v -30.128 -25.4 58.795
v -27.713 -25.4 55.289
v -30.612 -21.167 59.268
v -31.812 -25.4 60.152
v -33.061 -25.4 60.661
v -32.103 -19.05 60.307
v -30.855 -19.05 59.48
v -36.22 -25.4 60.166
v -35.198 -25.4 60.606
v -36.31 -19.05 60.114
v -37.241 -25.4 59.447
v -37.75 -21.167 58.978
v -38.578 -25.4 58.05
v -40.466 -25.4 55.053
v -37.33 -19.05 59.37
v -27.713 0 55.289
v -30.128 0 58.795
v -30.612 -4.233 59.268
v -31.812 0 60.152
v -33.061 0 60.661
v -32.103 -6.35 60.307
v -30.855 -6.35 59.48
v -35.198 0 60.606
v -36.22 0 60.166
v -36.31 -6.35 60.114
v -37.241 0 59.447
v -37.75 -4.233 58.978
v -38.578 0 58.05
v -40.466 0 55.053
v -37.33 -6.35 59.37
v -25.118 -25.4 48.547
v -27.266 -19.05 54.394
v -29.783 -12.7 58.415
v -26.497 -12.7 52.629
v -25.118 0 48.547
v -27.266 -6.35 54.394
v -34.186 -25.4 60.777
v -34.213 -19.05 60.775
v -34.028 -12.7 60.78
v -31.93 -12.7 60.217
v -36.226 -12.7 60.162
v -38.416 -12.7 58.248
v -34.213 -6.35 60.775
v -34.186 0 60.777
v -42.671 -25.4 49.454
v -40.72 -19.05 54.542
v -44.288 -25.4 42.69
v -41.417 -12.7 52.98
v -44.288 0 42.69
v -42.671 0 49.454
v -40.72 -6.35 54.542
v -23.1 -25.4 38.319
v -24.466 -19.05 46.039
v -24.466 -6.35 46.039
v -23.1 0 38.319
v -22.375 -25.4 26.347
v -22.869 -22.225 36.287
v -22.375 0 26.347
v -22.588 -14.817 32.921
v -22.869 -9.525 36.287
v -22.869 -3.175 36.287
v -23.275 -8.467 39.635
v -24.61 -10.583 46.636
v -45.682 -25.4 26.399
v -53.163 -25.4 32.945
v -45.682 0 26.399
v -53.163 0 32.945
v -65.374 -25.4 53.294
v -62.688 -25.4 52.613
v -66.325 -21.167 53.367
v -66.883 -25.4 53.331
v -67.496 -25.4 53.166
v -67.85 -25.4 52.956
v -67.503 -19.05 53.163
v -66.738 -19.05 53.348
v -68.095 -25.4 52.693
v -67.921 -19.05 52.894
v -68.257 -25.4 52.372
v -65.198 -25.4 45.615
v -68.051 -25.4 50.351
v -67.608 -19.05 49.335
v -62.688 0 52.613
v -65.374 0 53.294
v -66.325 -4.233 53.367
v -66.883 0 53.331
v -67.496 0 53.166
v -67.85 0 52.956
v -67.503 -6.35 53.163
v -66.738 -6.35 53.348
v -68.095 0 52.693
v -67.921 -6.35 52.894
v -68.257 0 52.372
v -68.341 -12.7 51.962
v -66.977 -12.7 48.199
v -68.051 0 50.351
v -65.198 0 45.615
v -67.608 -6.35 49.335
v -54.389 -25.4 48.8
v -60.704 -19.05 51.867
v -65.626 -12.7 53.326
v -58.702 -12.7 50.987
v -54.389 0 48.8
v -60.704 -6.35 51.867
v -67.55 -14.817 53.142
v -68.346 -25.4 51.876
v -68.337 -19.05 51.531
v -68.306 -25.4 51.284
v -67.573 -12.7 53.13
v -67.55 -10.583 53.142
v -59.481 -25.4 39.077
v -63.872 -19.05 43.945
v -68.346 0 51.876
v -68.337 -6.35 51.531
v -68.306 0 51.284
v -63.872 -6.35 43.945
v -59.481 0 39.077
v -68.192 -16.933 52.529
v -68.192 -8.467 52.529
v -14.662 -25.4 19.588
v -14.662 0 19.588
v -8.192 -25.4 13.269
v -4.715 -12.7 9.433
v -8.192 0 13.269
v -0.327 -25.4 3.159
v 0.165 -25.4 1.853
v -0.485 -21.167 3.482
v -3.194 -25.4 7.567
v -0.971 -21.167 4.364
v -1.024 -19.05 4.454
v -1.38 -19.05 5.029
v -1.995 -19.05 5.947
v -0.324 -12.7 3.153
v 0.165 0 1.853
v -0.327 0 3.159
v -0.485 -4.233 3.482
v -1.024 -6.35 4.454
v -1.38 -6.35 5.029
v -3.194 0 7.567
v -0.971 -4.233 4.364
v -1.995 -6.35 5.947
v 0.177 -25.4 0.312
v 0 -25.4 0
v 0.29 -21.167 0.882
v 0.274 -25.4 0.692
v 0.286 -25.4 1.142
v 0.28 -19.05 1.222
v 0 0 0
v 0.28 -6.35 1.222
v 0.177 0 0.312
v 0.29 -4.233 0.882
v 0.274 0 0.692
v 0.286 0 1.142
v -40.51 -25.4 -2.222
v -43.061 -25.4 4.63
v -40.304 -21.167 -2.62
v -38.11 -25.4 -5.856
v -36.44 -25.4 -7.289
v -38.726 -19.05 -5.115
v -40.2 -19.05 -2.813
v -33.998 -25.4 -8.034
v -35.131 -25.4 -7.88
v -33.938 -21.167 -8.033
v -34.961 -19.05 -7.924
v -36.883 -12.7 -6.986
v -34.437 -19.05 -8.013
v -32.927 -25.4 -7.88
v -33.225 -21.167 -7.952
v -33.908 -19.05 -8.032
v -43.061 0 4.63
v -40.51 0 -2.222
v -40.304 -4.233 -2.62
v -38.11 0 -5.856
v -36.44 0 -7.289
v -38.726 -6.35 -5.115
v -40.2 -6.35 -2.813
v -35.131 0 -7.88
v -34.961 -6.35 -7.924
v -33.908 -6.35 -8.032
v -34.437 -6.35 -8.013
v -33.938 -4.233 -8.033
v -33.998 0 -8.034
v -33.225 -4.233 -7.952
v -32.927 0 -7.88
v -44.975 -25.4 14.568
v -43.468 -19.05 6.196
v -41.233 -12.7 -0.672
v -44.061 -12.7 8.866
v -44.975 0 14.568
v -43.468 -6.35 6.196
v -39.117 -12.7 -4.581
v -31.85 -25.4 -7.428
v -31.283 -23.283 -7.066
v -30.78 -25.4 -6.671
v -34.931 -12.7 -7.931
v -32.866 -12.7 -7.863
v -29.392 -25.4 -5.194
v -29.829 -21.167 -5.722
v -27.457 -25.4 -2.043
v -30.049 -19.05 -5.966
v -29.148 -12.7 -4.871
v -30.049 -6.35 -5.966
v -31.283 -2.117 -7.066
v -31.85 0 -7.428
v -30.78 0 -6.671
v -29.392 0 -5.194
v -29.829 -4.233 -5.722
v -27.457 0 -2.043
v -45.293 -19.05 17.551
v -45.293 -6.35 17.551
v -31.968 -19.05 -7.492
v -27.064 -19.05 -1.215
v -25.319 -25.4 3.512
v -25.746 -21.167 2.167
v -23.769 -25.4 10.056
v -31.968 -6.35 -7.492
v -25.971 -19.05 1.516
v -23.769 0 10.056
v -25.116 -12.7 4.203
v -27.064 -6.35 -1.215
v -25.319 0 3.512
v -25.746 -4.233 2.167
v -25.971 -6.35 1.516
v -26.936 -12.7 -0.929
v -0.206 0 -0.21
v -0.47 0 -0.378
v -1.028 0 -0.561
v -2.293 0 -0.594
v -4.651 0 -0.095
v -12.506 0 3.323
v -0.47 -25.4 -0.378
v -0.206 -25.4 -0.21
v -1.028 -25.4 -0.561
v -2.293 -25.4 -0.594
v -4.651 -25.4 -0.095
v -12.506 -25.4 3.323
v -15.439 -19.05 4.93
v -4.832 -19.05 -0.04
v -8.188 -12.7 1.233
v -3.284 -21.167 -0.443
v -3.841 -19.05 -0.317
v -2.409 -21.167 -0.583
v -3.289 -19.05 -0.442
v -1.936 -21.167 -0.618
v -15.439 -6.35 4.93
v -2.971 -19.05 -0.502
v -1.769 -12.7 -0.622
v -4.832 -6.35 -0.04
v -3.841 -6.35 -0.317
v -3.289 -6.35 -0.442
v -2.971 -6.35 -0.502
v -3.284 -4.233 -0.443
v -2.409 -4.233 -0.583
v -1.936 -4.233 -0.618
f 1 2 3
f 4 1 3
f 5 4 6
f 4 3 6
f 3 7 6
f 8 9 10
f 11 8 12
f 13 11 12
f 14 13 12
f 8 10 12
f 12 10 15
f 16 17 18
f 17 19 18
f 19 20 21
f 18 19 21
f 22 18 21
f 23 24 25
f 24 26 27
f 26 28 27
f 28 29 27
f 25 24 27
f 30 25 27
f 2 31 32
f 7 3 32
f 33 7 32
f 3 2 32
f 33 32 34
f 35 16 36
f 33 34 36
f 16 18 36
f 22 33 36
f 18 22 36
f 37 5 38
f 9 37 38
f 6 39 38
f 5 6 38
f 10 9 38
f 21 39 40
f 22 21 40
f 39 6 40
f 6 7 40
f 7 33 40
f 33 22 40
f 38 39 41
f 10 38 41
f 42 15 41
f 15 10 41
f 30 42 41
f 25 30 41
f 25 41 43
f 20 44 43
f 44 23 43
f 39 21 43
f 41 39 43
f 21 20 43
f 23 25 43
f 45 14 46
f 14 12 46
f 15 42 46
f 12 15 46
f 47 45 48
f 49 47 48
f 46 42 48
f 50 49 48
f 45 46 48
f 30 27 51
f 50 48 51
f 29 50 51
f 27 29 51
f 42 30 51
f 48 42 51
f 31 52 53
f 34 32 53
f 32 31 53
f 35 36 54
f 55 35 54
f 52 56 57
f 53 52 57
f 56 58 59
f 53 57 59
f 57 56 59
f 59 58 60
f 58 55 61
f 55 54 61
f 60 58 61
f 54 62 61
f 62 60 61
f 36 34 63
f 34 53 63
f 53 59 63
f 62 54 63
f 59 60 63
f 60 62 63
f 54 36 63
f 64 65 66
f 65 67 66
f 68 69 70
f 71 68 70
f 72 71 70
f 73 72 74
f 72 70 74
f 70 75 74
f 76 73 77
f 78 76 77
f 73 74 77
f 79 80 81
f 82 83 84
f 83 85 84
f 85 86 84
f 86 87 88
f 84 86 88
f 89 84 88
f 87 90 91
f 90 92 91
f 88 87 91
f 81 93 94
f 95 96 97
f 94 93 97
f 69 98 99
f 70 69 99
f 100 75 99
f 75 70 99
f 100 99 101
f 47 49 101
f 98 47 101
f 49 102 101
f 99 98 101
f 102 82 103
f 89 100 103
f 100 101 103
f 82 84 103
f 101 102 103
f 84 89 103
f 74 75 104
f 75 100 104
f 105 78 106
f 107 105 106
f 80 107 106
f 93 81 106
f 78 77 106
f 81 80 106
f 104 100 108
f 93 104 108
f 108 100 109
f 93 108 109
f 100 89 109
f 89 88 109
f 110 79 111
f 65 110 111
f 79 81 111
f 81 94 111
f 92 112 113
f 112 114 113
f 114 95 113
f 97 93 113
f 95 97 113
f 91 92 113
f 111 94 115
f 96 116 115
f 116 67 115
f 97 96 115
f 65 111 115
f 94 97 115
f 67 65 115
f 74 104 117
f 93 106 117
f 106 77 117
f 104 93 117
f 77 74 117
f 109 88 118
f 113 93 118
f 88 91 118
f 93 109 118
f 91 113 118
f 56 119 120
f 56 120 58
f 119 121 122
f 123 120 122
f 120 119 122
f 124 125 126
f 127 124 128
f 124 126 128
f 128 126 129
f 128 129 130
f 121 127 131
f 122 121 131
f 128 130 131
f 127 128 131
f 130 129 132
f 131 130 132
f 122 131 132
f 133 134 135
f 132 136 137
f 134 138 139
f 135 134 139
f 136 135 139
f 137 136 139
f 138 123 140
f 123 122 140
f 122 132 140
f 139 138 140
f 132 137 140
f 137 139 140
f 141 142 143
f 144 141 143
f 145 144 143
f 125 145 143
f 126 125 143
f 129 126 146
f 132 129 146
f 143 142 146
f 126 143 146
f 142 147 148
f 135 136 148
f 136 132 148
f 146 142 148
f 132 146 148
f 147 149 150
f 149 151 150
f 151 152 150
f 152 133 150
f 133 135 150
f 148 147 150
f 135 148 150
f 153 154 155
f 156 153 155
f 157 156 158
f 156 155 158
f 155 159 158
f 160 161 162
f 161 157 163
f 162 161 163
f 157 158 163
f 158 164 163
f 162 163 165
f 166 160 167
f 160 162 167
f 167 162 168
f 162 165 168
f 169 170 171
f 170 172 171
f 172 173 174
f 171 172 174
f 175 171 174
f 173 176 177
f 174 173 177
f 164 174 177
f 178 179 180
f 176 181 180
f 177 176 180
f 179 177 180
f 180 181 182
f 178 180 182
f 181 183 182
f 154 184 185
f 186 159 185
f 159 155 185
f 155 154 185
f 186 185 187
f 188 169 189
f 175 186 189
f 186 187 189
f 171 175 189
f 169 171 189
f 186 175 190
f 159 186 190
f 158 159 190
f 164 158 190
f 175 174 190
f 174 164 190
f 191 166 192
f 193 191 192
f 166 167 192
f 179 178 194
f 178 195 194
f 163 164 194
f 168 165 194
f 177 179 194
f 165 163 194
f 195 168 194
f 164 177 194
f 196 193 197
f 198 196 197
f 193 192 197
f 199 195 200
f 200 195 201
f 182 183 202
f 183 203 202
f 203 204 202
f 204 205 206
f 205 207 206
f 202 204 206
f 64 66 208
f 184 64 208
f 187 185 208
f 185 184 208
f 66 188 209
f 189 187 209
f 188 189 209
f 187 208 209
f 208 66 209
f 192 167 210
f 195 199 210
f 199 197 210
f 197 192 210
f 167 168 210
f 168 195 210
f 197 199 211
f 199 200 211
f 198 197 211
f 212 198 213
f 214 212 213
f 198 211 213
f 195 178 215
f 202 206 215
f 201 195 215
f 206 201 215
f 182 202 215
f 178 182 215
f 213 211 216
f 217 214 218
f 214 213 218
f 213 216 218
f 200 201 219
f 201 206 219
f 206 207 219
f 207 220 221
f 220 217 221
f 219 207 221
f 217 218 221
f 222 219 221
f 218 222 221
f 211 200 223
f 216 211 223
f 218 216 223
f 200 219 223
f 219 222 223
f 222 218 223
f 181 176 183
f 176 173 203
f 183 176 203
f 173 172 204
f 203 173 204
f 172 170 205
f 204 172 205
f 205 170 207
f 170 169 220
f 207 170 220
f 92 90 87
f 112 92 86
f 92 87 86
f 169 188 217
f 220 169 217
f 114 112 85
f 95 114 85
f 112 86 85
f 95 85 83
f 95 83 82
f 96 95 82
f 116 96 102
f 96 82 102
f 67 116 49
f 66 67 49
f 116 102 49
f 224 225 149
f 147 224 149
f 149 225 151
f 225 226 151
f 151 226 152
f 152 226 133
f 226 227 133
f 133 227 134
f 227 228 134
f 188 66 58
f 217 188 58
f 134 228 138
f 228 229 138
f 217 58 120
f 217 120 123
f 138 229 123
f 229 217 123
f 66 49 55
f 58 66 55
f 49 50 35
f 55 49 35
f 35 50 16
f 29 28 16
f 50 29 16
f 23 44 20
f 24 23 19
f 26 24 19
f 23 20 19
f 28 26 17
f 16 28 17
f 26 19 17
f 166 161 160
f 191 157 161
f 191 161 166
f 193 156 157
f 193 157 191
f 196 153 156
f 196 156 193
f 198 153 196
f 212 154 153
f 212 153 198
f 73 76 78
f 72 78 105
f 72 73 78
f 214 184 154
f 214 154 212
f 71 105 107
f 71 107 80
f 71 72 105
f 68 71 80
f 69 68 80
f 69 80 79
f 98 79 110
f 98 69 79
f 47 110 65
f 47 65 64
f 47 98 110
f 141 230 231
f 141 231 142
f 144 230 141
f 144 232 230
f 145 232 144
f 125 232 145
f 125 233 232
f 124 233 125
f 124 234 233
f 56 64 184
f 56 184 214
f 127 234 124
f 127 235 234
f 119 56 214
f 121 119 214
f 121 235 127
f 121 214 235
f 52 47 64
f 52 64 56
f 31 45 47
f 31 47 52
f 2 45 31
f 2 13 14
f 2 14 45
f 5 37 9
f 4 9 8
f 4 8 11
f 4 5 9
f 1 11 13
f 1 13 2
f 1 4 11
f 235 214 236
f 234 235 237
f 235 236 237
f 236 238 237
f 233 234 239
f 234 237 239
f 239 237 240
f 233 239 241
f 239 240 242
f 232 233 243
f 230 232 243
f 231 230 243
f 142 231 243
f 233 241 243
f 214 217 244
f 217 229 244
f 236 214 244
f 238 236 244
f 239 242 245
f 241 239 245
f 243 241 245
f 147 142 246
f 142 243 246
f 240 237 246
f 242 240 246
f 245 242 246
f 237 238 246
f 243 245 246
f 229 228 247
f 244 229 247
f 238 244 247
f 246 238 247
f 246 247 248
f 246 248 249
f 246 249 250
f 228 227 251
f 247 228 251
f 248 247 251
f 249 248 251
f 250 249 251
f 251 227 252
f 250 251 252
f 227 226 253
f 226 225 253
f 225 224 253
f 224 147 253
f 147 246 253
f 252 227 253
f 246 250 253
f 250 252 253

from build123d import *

# Parameters (mm, degrees)
F1_DEPTH = 25.4


with BuildPart() as f1:
    # F0 (on Front) → F1 (new body)
    with BuildSketch(Plane.XZ):
        with BuildLine():
            add(Edge.make_bspline(
                [(-23.7685478879, 10.0557711837), (-2.8513099786, -3.6790146109), (0, 0)],
                knots=[5.1464295715, 5.1464295715, 5.1464295715, 6.2831853072, 6.2831853072, 6.2831853072], degree=2, weights=[1, 0.8427752216, 1]))
            add(Edge.make_bspline(
                [(0, 0), (3.5909872709, 4.6334122688), (-22.3747425204, 26.3469081794)],
                knots=[0, 0, 0, 1.3547963993, 1.3547963993, 1.3547963993], degree=2, weights=[1, 0.779206079, 1]))
            add(Edge.make_bspline(
                [(-23.7685478879, 10.0557711837), (-22.3769478232, 17.6832466322), (-22.3747425204, 26.3469081794)],
                knots=[4.2182941759, 4.2182941759, 4.2182941759, 4.7116374486, 4.7116374486, 4.7116374486], degree=2, weights=[1, 0.9697305037, 1]))
        make_face()
        with BuildLine():
            add(Edge.make_bspline(
                [(-23.7685478879, 10.0557711837), (-22.3769478232, 17.6832466322), (-22.3747425204, 26.3469081794)],
                knots=[4.2182941759, 4.2182941759, 4.2182941759, 4.7116374486, 4.7116374486, 4.7116374486], degree=2, weights=[1, 0.9697305037, 1]))
            add(Edge.make_bspline(
                [(-22.3747425204, 26.3469081794), (-33.252461311, 35.4432557258), (-44.2884452986, 42.6897610607)],
                knots=[1.3547963993, 1.3547963993, 1.3547963993, 2.0048369179, 2.0048369179, 2.0048369179], degree=2, weights=[1, 0.9476442572, 1]))
            add(Edge.make_bspline(
                [(-44.2884452986, 42.6897610607), (-45.6800453633, 35.0622856122), (-45.6822506661, 26.398624065)],
                knots=[1.0767015223, 1.0767015223, 1.0767015223, 1.570044795, 1.570044795, 1.570044795], degree=2, weights=[1, 0.9697305037, 1]))
            add(Edge.make_bspline(
                [(-45.6822506661, 26.398624065), (-34.8045318754, 17.3022765186), (-23.7685478879, 10.0557711837)],
                knots=[4.4963890529, 4.4963890529, 4.4963890529, 5.1464295715, 5.1464295715, 5.1464295715], degree=2, weights=[1, 0.9476442572, 1]))
        make_face()
        with BuildLine():
            add(Edge.make_bspline(
                [(-22.3747425204, 26.3469081794), (-33.252461311, 35.4432557258), (-44.2884452986, 42.6897610607)],
                knots=[1.3547963993, 1.3547963993, 1.3547963993, 2.0048369179, 2.0048369179, 2.0048369179], degree=2, weights=[1, 0.9476442572, 1]))
            add(Edge.make_bspline(
                [(-22.3747425204, 26.3469081794), (-22.3659777675, 60.7797540724), (-34.0284965932, 60.7797540724)],
                knots=[4.7116374486, 4.7116374486, 4.7116374486, 6.2831853072, 6.2831853072, 6.2831853072], degree=2, weights=[1, 0.7068410247, 1]))
            add(Edge.make_bspline(
                [(-34.0284965932, 60.7797540724), (-40.9880039381, 60.7797540724), (-44.2884452986, 42.6897610607)],
                knots=[0, 0, 0, 1.0767015223, 1.0767015223, 1.0767015223], degree=2, weights=[1, 0.8585554476, 1]))
        make_face()
        with BuildLine():
            add(Edge.make_bspline(
                [(-45.6822506661, 26.398624065), (-45.689076912, -0.4186836893), (-36.8825765449, -6.9864162792), (-28.0760761777, -13.554148869), (-23.7685478879, 10.0557711837)],
                knots=[1.570044795, 1.570044795, 1.570044795, 2.8941694854, 2.8941694854, 4.2182941759, 4.2182941759, 4.2182941759], degree=2, weights=[1, 0.7887260938, 1, 0.7887260938, 1]))
            add(Edge.make_bspline(
                [(-45.6822506661, 26.398624065), (-34.8045318754, 17.3022765186), (-23.7685478879, 10.0557711837)],
                knots=[4.4963890529, 4.4963890529, 4.4963890529, 5.1464295715, 5.1464295715, 5.1464295715], degree=2, weights=[1, 0.9476442572, 1]))
        make_face()
        with BuildLine():
            add(Edge.make_bspline(
                [(-44.2884452986, 42.6897610607), (-45.6800453633, 35.0622856122), (-45.6822506661, 26.398624065)],
                knots=[1.0767015223, 1.0767015223, 1.0767015223, 1.570044795, 1.570044795, 1.570044795], degree=2, weights=[1, 0.9697305037, 1]))
            add(Edge.make_bspline(
                [(-44.2884452986, 42.6897610607), (-141.479830545, 106.5080750863), (-45.6822506661, 26.398624065)],
                knots=[2.0048369179, 2.0048369179, 2.0048369179, 4.4963890529, 4.4963890529, 4.4963890529], degree=2, weights=[1, 0.3193279845, 1]))
        make_face()
    extrude(amount=F1_DEPTH)


solid = f1.part
